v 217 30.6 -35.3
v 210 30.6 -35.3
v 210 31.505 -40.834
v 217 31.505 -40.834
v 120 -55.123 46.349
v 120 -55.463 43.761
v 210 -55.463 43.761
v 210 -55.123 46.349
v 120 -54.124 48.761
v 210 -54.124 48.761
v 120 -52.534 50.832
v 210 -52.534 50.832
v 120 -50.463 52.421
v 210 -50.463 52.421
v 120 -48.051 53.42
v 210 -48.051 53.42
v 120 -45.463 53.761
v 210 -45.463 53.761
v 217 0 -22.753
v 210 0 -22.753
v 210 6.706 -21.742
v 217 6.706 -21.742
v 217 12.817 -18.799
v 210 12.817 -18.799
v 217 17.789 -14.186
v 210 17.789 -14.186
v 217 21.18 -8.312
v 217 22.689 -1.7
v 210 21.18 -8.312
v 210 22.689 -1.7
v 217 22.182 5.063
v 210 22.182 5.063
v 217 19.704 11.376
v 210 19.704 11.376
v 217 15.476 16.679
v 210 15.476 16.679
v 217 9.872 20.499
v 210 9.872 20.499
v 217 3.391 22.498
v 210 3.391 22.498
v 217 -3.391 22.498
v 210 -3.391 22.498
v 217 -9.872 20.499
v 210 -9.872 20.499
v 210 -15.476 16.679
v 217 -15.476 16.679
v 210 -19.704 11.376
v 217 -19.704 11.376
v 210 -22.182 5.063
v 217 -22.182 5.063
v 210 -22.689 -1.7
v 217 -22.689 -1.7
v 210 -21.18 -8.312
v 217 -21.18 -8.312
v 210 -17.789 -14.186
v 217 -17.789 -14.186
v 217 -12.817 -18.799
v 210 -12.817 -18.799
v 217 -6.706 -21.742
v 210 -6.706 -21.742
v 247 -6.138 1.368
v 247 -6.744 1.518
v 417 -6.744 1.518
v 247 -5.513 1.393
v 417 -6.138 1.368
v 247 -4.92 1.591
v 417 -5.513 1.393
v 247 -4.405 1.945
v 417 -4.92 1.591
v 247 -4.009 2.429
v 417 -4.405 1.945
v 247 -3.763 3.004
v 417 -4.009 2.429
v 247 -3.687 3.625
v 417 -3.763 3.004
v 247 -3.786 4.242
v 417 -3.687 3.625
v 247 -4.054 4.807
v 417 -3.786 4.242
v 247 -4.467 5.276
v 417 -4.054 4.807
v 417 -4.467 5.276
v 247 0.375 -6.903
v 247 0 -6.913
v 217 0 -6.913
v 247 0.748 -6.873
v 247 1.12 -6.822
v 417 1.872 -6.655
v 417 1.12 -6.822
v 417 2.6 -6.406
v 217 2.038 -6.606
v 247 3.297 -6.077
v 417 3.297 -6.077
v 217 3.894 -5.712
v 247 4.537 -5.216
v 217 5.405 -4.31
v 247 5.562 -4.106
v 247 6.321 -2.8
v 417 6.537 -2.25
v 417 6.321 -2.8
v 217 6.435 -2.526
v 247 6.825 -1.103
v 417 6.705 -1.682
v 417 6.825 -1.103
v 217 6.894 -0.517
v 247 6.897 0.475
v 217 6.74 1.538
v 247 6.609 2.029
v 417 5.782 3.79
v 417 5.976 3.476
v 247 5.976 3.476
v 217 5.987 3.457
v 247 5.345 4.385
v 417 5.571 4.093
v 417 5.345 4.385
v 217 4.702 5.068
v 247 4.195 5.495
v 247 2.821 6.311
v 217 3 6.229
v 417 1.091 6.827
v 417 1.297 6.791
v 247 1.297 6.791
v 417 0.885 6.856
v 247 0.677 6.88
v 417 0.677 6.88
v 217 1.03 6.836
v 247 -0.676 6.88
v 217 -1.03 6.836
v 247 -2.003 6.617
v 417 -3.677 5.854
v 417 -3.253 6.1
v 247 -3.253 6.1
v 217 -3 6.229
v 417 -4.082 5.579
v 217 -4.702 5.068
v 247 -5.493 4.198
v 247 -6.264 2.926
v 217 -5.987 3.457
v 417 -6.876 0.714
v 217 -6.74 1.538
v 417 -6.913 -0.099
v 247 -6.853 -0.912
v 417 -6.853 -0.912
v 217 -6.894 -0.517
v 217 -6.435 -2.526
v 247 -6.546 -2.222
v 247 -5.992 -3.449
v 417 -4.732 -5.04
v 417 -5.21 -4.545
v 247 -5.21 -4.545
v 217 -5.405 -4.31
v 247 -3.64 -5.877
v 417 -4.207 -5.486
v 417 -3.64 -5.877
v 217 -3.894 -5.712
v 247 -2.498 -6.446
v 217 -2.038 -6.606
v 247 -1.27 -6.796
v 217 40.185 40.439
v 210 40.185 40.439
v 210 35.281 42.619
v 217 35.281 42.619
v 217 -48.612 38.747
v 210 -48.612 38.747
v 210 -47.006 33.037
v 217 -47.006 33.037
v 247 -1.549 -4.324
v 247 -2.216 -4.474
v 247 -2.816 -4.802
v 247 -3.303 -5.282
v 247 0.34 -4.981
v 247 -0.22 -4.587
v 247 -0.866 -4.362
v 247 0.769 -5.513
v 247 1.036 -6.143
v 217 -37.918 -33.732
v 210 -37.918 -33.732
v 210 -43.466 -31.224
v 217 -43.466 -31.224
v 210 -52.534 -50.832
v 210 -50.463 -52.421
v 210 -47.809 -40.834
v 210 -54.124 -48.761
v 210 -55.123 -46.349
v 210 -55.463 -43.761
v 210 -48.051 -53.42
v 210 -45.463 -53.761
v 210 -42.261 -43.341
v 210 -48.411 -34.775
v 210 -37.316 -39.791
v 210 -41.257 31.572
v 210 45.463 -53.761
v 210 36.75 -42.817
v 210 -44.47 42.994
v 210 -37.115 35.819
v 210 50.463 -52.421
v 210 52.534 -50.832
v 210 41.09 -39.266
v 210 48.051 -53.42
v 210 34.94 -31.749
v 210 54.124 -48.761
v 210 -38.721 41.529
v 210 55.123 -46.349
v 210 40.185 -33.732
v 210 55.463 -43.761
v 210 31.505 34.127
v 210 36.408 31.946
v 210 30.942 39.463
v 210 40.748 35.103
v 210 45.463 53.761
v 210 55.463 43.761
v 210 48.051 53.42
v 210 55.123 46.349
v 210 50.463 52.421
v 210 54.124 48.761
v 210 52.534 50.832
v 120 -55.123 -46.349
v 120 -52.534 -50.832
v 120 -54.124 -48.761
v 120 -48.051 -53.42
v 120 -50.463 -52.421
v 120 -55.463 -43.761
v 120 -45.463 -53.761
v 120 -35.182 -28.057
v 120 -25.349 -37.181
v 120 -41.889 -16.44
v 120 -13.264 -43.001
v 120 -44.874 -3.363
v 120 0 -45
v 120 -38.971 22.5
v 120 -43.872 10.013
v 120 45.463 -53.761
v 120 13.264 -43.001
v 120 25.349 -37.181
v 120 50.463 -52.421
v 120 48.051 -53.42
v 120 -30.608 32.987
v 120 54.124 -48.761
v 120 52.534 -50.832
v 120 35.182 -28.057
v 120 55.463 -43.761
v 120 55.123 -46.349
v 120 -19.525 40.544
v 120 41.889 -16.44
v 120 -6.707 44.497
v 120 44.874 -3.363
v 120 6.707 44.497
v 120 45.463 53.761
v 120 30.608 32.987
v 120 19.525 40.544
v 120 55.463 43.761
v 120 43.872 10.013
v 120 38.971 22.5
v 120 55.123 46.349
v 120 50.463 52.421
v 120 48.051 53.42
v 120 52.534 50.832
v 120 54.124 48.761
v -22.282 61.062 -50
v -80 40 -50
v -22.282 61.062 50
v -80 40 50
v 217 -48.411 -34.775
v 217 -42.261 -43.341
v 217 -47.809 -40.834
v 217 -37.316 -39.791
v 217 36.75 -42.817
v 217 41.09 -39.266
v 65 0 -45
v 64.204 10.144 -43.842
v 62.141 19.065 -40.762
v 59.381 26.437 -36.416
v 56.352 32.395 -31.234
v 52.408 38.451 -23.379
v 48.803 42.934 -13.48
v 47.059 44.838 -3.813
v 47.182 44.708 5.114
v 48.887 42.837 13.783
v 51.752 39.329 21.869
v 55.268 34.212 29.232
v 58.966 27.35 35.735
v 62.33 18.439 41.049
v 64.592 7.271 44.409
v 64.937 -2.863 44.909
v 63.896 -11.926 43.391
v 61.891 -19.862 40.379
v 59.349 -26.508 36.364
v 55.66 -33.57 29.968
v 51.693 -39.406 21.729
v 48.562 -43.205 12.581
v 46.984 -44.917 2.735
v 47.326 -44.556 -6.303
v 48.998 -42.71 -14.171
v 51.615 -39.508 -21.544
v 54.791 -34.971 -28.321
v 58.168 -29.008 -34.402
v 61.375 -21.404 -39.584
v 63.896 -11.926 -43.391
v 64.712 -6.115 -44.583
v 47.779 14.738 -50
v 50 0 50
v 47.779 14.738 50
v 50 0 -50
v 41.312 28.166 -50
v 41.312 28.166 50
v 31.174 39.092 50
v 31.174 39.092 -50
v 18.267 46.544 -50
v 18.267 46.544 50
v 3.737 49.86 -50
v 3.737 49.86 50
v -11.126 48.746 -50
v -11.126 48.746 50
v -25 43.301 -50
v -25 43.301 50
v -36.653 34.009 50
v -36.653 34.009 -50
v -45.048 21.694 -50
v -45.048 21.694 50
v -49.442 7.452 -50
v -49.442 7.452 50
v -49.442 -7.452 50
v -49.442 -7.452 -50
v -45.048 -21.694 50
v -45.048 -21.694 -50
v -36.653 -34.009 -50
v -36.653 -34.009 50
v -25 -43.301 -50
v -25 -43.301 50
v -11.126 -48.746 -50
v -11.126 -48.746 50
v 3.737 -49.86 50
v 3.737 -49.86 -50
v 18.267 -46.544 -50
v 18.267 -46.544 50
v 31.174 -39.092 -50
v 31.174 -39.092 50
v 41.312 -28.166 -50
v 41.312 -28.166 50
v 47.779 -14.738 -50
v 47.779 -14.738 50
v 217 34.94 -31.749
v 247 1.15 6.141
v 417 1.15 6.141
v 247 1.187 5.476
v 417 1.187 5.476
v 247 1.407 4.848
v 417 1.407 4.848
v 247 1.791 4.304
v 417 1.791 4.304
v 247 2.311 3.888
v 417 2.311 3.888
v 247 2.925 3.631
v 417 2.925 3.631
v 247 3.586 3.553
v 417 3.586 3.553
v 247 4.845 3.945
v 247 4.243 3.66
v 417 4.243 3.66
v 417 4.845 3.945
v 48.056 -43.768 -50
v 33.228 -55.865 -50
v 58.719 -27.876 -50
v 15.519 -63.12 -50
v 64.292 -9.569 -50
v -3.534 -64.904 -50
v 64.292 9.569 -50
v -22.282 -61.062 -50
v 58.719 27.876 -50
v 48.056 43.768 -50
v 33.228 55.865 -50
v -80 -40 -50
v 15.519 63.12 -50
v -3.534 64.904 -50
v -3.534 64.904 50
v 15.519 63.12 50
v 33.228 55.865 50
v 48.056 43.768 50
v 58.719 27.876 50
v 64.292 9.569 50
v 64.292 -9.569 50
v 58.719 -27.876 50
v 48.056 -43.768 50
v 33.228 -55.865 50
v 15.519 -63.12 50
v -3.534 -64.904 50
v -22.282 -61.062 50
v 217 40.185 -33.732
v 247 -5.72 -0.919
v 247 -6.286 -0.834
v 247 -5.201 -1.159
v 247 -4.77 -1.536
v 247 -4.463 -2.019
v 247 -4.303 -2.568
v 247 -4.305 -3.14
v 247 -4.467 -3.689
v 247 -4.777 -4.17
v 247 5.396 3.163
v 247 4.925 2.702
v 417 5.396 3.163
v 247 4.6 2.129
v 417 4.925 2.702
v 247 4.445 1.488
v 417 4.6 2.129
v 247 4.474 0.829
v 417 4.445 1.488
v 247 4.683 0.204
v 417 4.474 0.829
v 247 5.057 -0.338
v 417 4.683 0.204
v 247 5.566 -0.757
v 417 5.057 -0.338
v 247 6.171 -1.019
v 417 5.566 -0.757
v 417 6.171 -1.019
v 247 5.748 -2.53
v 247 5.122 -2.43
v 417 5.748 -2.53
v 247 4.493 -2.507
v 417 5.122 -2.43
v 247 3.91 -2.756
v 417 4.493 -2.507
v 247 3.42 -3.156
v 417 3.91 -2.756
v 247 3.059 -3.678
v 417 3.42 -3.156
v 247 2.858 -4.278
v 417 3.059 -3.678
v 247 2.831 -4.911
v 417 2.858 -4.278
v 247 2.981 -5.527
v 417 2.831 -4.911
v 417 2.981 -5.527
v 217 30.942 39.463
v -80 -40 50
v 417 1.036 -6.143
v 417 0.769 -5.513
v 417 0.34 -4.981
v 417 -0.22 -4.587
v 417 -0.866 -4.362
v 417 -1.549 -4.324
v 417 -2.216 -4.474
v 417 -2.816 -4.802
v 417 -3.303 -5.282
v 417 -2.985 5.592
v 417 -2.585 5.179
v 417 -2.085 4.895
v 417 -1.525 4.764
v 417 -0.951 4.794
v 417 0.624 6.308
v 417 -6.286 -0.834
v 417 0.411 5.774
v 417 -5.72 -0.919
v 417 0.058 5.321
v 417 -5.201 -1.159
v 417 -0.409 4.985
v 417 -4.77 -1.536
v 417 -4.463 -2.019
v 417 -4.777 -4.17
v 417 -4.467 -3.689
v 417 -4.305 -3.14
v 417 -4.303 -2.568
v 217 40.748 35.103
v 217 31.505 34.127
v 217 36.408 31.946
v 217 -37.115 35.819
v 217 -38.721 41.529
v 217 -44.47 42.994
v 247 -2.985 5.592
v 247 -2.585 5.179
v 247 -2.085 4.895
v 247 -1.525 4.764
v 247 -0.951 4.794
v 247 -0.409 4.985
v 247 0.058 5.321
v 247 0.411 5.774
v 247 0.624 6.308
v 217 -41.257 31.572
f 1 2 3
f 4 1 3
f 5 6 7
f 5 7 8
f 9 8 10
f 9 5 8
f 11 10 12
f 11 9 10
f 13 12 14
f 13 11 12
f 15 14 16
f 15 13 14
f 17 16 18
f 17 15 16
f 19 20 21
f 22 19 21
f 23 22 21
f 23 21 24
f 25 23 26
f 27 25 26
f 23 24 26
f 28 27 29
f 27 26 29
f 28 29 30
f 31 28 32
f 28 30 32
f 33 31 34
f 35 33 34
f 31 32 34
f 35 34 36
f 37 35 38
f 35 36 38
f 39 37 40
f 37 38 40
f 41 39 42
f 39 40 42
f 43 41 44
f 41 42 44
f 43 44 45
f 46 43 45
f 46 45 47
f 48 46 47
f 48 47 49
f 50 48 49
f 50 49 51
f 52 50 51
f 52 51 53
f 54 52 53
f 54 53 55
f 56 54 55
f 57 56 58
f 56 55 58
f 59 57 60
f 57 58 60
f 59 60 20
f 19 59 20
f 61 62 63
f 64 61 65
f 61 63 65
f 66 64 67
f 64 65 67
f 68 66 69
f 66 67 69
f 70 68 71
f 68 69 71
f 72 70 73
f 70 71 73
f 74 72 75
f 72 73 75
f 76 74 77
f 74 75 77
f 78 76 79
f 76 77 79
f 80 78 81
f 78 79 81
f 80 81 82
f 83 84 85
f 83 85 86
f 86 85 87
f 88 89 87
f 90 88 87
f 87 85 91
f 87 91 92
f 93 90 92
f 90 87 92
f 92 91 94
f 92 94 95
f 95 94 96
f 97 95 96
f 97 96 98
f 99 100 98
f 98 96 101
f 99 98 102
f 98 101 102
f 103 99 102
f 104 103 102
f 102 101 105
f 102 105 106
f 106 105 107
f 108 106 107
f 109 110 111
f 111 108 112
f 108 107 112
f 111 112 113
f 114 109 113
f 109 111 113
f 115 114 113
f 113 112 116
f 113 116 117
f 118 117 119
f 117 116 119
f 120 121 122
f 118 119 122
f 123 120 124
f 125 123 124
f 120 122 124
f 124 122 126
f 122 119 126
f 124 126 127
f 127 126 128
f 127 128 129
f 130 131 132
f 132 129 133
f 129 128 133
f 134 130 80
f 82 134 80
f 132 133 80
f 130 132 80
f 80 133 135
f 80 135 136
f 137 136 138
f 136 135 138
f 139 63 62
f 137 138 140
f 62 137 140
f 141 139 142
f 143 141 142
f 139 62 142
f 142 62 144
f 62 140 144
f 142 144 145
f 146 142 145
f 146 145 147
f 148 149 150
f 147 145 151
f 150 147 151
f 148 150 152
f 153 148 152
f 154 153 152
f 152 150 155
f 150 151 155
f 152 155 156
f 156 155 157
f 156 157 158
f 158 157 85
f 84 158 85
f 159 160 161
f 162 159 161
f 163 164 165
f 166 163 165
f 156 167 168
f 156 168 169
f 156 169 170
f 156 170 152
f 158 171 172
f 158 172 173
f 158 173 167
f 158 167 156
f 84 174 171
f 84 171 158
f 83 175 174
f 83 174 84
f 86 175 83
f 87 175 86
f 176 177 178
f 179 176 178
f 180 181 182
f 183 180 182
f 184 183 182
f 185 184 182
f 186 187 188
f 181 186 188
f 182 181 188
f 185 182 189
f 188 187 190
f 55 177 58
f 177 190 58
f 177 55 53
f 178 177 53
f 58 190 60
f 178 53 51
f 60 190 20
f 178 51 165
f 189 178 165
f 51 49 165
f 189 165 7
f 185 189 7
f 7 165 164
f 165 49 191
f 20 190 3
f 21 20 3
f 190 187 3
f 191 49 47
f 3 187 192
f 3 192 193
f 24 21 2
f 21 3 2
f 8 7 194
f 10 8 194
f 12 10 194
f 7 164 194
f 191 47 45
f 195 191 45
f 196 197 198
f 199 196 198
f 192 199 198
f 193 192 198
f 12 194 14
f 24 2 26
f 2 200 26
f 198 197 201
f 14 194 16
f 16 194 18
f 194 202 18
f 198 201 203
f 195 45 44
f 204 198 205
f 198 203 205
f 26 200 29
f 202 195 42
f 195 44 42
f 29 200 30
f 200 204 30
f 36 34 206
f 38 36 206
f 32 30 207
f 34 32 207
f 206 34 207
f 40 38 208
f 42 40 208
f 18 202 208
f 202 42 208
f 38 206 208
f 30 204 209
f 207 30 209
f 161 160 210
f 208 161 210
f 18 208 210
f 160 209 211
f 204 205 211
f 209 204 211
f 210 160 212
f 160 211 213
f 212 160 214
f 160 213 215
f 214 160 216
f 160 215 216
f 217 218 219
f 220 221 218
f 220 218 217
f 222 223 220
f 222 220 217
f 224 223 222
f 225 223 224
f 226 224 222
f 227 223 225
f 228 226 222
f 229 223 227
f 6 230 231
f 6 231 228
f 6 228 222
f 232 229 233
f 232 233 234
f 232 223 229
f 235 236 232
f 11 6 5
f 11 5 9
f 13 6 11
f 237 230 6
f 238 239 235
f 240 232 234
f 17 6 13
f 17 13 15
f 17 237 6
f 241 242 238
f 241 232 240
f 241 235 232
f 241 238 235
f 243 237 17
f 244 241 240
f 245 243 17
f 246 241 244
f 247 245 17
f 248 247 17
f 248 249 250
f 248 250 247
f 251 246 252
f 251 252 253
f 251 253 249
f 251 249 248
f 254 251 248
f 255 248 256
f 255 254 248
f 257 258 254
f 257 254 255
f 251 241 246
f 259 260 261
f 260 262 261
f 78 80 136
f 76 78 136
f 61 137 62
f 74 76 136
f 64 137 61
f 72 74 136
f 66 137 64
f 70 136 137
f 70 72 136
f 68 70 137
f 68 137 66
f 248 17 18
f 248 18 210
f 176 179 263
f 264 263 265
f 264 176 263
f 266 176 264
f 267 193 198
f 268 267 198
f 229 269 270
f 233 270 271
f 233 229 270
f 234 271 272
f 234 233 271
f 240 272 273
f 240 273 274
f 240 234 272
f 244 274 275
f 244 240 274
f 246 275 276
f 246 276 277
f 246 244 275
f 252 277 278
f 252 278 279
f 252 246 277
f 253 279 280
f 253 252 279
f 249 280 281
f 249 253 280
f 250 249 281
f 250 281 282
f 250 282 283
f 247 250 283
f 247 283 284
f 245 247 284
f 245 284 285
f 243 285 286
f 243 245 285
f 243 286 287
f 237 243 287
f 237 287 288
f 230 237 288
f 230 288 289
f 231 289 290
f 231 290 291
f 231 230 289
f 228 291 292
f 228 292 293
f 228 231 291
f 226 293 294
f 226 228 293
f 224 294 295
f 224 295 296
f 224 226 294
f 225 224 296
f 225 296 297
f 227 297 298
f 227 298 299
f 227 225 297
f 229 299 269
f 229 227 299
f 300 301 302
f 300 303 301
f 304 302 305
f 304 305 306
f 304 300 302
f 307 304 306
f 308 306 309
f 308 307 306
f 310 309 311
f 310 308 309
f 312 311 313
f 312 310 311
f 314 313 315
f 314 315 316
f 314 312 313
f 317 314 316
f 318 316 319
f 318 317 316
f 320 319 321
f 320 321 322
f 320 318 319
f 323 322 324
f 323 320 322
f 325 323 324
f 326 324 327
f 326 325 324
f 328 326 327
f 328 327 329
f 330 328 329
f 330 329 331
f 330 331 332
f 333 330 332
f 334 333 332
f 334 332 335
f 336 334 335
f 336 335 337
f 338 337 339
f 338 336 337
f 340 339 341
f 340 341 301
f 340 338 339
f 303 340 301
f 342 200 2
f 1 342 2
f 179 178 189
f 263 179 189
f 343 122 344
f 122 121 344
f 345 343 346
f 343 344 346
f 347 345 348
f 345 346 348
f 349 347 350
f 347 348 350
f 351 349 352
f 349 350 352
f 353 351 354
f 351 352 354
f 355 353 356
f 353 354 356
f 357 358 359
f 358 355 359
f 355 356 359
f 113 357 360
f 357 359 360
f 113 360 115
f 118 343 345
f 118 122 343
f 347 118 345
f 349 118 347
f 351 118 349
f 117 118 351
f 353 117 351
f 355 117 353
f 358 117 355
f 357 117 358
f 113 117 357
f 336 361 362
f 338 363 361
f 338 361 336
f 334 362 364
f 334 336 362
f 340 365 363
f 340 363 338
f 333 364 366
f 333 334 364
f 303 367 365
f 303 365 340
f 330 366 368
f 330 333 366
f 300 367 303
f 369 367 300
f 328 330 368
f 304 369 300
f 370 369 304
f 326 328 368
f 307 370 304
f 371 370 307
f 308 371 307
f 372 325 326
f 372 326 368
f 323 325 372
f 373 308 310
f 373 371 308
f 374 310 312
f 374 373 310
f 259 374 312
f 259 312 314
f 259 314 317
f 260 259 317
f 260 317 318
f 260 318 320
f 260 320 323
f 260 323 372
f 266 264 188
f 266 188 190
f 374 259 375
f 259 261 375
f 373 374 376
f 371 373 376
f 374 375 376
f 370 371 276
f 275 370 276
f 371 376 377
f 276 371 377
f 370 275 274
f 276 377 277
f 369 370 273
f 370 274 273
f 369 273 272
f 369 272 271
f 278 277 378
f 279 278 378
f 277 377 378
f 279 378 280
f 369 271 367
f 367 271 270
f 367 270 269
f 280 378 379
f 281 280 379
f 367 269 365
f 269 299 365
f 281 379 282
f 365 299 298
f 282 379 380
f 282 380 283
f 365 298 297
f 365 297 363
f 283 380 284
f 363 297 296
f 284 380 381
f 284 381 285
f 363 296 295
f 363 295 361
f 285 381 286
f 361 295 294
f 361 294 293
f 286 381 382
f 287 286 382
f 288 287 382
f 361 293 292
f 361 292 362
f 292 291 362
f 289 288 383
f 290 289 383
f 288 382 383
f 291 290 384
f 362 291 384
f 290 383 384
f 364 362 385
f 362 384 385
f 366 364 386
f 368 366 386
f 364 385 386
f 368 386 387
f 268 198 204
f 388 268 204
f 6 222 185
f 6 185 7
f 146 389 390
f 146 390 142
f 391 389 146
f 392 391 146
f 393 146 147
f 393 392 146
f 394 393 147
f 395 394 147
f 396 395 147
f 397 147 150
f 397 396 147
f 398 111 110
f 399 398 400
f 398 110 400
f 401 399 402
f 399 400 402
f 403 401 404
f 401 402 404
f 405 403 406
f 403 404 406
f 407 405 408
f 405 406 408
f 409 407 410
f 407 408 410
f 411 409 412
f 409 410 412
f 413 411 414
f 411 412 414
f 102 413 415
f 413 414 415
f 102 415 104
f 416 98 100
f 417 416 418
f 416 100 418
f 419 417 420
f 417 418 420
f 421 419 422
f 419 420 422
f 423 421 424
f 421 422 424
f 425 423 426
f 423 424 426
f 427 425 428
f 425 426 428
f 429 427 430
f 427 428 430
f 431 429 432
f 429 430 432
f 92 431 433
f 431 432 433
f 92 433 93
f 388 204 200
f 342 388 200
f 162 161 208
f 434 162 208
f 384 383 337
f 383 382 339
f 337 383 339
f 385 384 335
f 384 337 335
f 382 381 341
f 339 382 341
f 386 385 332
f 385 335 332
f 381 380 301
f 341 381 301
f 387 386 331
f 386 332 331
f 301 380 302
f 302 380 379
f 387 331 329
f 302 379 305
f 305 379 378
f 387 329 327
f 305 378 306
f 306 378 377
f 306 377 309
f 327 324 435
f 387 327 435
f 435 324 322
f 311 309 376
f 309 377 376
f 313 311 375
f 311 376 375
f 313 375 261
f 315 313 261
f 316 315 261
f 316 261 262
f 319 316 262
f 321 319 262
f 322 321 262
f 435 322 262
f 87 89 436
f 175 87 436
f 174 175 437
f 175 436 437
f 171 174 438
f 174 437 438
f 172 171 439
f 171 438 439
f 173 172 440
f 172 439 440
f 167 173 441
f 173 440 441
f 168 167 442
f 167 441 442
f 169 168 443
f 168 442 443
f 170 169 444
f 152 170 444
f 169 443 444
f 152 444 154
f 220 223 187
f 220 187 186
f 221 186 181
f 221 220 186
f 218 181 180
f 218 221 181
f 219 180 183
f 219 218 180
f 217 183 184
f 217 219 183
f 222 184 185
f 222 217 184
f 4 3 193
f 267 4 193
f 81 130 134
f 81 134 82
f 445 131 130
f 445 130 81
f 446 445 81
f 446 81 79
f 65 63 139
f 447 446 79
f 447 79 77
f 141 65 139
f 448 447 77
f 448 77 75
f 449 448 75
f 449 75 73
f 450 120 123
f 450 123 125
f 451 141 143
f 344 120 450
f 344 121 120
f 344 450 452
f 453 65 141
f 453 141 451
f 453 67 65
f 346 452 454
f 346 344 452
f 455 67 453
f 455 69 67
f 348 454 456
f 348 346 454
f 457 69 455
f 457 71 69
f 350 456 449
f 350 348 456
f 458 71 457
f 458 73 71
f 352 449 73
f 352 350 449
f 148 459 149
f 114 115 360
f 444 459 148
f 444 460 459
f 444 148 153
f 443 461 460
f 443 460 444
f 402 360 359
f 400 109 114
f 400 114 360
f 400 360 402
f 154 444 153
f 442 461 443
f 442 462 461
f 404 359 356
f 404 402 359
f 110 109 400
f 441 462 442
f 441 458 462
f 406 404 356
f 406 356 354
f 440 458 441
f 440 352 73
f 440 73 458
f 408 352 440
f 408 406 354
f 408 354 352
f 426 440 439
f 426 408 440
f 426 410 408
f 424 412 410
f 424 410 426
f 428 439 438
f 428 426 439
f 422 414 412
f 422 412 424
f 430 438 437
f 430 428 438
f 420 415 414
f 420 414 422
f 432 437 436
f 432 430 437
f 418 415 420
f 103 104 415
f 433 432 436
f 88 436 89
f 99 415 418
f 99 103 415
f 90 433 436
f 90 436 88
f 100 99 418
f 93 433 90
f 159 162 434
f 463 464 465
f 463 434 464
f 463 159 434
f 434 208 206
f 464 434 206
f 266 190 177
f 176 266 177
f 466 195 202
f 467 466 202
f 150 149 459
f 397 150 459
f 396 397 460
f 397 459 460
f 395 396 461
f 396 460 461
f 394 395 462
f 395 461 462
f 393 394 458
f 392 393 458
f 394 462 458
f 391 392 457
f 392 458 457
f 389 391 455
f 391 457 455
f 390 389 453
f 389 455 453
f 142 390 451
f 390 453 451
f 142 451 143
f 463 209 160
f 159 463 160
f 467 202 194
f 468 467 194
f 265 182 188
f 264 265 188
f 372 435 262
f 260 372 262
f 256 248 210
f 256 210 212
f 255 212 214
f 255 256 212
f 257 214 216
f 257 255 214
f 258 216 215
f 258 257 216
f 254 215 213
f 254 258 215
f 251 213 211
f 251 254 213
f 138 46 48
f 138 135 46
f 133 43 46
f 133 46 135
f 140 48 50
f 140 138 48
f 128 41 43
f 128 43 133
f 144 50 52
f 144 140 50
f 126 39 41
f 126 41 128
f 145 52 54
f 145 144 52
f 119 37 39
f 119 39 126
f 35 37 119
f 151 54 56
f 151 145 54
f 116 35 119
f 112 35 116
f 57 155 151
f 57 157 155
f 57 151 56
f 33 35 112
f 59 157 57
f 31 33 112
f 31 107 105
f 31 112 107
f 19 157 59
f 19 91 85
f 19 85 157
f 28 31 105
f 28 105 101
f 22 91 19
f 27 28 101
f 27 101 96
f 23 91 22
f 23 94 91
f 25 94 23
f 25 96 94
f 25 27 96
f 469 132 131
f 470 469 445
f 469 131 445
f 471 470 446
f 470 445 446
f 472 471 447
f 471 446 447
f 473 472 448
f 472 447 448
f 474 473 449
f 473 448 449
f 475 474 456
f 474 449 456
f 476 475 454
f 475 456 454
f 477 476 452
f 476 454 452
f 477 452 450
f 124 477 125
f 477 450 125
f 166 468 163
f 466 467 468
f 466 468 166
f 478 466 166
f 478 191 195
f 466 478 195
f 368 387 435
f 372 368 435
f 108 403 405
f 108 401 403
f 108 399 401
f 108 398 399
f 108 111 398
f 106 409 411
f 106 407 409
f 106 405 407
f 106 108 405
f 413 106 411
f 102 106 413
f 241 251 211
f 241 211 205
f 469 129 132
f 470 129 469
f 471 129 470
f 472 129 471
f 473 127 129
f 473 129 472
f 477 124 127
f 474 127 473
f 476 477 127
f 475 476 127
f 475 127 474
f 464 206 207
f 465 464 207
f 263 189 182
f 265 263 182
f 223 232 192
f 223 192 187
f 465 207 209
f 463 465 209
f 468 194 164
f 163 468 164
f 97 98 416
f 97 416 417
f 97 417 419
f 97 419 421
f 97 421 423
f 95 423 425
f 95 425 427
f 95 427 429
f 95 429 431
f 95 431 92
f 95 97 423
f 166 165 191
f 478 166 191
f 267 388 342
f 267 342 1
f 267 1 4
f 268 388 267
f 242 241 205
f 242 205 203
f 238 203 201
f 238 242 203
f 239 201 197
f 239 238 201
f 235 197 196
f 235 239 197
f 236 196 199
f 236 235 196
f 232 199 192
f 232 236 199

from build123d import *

# Parameters (mm, degrees)
IZIM1_R                          = 50
Y_KSEKLIK_EKSTR_ZYON1_DEPTH      = 50
Y_KSEKLIK_EKSTR_ZYON2_REACH      = 218.16
Y_KSEKLIK_EKSTR_ZYON2_END_RADIUS = 65
IZIM2_R                          = 45
SALIENTE_EXTRUIR1_DEPTH          = 90
CROQUIS2_R                       = 22.752579474
SALIENTE_EXTRUIR2_DEPTH          = 7
SALIENTE_EXTRUIR4_DEPTH          = 7
CROQUIS4_R                       = 6.913256955
SALIENTE_EXTRUIR5_DEPTH          = 200
CROQUIS5_R                       = 2.363211774
CROQUIS5_R_2                     = 2.015238115
CROQUIS5_R_3                     = 2.465720792
CROQUIS5_R_4                     = 2.259668923
CROQUIS5_R_5                     = 2.225924281
CROQUIS5_R_6                     = 2.025363273
CROQUIS5_R_7                     = 2.390624595
CORTAR_EXTRUIR1_DEPTH            = 170


with BuildPart() as part:
    # Çizim1 → Yükseklik-Ekstrüzyon1 (new, symmetric)
    with BuildSketch(Plane.XY):
        with BuildLine():
            Line((-80, -40), (-80, 40))
            Line((-80, 40), (-22.281665693, 61.061668614))
            ThreePointArc((-22.281665693, 61.061668614), (65, 0), (-22.281665693, -61.061668614))
            Line((-22.281665693, -61.061668614), (-80, -40))
        make_face()
        Circle(IZIM1_R, mode=Mode.SUBTRACT)
    extrude(amount=Y_KSEKLIK_EKSTR_ZYON1_DEPTH, both=True)

    # Yükseklik-Ekstrüzyon2: up to this cylinder (the profile starts outside it)
    y_kseklik_ekstr_zyon2_end = Plane(origin=(0, 0, 0), z_dir=(0, 0, -1)) * Cylinder(Y_KSEKLIK_EKSTR_ZYON2_END_RADIUS, 567.32, mode=Mode.PRIVATE)
    # Çizim2 → Yükseklik-Ekstrüzyon2 (add, up to the surface)
    with BuildSketch(Plane(origin=(120, 0, 0), x_dir=(0, 0, -1), z_dir=(1, 0, 0)), mode=Mode.PRIVATE) as y_kseklik_ekstr_zyon2_sk1:
        Circle(IZIM2_R)
    y_kseklik_ekstr_zyon2_tool1 = extrude(y_kseklik_ekstr_zyon2_sk1.sketch, amount=-Y_KSEKLIK_EKSTR_ZYON2_REACH, mode=Mode.PRIVATE) - y_kseklik_ekstr_zyon2_end
    add(y_kseklik_ekstr_zyon2_tool1.solids().sort_by_distance((120, 0, 0))[0])

    # Croquis1 → Saliente-Extruir1 (add)
    with BuildSketch(Plane(origin=(120, 0, 0), x_dir=(0, 0, -1), z_dir=(1, 0, 0))):
        with BuildLine():
            Line((-43.760835361, 55.463261814), (43.760835361, 55.463261814))
            ThreePointArc((43.760835361, 55.463261814), (50.831903173, 52.534329626), (53.760835361, 45.463261814))
            Line((53.760835361, 45.463261814), (53.760835361, -45.463261814))
            ThreePointArc((53.760835361, -45.463261814), (50.831903173, -52.534329626), (43.760835361, -55.463261814))
            Line((43.760835361, -55.463261814), (-43.760835361, -55.463261814))
            ThreePointArc((-43.760835361, -55.463261814), (-50.831903173, -52.534329626), (-53.760835361, -45.463261814))
            Line((-53.760835361, -45.463261814), (-53.760835361, 45.463261814))
            ThreePointArc((-53.760835361, 45.463261814), (-50.831903173, 52.534329626), (-43.760835361, 55.463261814))
        make_face()
    extrude(amount=SALIENTE_EXTRUIR1_DEPTH)

    # Croquis2 → Saliente-Extruir2 (add)
    with BuildSketch(Plane(origin=(210, 0, 0), x_dir=(0, 0, -1), z_dir=(1, 0, 0))):
        Circle(CROQUIS2_R)
    extrude(amount=SALIENTE_EXTRUIR2_DEPTH)

    # Croquis3 → Saliente-Extruir4 (add)
    with BuildSketch(Plane(origin=(210, 0, 0), x_dir=(0, 0, -1), z_dir=(1, 0, 0))):
        Polygon((-34.126669907, 31.505010412), (-31.946398065, 36.408284276), (-35.102621872, 40.748092009), (-40.43911752, 40.18462588), (-42.619389362, 35.281352017), (-39.463165555, 30.941544283), align=None)
        Polygon((40.833645496, 31.505010412), (42.816653349, 36.749955525), (39.265901567, 41.089763259), (33.732141931, 40.18462588), (31.749134077, 34.939680767), (35.299885859, 30.599873033), align=None)
        Polygon((-33.036533986, -47.006056772), (-31.572165729, -41.257329502), (-35.818525457, -37.114785756), (-41.529253441, -38.720969281), (-42.993621697, -44.469696551), (-38.74726197, -48.612240297), align=None)
        Polygon((40.833645496, -47.809148535), (43.341315592, -42.261289535), (39.79056381, -37.315654026), (33.732141931, -37.917877518), (31.224471834, -43.465736518), (34.775223617, -48.411372026), align=None)
    extrude(amount=SALIENTE_EXTRUIR4_DEPTH)

    # Croquis4 → Saliente-Extruir5 (add)
    with BuildSketch(Plane(origin=(217, 0, 0), x_dir=(0, 0, -1), z_dir=(1, 0, 0))):
        Circle(CROQUIS4_R)
    extrude(amount=SALIENTE_EXTRUIR5_DEPTH)

    # Croquis5 → Cortar-Extruir1 (cut)
    with BuildSketch(Plane(origin=(417, 0, 0), x_dir=(0, 0, -1), z_dir=(1, 0, 0))):
        with Locations((-1.260150117, 6.797436533)):
            Circle(CROQUIS5_R)
        with Locations((2.849183045, -6.298831456)):
            Circle(CROQUIS5_R_2)
        with Locations((6.781038585, -1.345599286)):
            Circle(CROQUIS5_R_3)
        with Locations((4.68896459, 5.080032756)):
            Circle(CROQUIS5_R_4)
        with Locations((-3.582760742, -5.912440037)):
            Circle(CROQUIS5_R_5)
        with Locations((-6.781038585, -1.345599286)):
            Circle(CROQUIS5_R_6)
        with Locations((-5.942846302, 3.532095633)):
            Circle(CROQUIS5_R_7)
    extrude(amount=-CORTAR_EXTRUIR1_DEPTH, mode=Mode.SUBTRACT)


solid = part.part
